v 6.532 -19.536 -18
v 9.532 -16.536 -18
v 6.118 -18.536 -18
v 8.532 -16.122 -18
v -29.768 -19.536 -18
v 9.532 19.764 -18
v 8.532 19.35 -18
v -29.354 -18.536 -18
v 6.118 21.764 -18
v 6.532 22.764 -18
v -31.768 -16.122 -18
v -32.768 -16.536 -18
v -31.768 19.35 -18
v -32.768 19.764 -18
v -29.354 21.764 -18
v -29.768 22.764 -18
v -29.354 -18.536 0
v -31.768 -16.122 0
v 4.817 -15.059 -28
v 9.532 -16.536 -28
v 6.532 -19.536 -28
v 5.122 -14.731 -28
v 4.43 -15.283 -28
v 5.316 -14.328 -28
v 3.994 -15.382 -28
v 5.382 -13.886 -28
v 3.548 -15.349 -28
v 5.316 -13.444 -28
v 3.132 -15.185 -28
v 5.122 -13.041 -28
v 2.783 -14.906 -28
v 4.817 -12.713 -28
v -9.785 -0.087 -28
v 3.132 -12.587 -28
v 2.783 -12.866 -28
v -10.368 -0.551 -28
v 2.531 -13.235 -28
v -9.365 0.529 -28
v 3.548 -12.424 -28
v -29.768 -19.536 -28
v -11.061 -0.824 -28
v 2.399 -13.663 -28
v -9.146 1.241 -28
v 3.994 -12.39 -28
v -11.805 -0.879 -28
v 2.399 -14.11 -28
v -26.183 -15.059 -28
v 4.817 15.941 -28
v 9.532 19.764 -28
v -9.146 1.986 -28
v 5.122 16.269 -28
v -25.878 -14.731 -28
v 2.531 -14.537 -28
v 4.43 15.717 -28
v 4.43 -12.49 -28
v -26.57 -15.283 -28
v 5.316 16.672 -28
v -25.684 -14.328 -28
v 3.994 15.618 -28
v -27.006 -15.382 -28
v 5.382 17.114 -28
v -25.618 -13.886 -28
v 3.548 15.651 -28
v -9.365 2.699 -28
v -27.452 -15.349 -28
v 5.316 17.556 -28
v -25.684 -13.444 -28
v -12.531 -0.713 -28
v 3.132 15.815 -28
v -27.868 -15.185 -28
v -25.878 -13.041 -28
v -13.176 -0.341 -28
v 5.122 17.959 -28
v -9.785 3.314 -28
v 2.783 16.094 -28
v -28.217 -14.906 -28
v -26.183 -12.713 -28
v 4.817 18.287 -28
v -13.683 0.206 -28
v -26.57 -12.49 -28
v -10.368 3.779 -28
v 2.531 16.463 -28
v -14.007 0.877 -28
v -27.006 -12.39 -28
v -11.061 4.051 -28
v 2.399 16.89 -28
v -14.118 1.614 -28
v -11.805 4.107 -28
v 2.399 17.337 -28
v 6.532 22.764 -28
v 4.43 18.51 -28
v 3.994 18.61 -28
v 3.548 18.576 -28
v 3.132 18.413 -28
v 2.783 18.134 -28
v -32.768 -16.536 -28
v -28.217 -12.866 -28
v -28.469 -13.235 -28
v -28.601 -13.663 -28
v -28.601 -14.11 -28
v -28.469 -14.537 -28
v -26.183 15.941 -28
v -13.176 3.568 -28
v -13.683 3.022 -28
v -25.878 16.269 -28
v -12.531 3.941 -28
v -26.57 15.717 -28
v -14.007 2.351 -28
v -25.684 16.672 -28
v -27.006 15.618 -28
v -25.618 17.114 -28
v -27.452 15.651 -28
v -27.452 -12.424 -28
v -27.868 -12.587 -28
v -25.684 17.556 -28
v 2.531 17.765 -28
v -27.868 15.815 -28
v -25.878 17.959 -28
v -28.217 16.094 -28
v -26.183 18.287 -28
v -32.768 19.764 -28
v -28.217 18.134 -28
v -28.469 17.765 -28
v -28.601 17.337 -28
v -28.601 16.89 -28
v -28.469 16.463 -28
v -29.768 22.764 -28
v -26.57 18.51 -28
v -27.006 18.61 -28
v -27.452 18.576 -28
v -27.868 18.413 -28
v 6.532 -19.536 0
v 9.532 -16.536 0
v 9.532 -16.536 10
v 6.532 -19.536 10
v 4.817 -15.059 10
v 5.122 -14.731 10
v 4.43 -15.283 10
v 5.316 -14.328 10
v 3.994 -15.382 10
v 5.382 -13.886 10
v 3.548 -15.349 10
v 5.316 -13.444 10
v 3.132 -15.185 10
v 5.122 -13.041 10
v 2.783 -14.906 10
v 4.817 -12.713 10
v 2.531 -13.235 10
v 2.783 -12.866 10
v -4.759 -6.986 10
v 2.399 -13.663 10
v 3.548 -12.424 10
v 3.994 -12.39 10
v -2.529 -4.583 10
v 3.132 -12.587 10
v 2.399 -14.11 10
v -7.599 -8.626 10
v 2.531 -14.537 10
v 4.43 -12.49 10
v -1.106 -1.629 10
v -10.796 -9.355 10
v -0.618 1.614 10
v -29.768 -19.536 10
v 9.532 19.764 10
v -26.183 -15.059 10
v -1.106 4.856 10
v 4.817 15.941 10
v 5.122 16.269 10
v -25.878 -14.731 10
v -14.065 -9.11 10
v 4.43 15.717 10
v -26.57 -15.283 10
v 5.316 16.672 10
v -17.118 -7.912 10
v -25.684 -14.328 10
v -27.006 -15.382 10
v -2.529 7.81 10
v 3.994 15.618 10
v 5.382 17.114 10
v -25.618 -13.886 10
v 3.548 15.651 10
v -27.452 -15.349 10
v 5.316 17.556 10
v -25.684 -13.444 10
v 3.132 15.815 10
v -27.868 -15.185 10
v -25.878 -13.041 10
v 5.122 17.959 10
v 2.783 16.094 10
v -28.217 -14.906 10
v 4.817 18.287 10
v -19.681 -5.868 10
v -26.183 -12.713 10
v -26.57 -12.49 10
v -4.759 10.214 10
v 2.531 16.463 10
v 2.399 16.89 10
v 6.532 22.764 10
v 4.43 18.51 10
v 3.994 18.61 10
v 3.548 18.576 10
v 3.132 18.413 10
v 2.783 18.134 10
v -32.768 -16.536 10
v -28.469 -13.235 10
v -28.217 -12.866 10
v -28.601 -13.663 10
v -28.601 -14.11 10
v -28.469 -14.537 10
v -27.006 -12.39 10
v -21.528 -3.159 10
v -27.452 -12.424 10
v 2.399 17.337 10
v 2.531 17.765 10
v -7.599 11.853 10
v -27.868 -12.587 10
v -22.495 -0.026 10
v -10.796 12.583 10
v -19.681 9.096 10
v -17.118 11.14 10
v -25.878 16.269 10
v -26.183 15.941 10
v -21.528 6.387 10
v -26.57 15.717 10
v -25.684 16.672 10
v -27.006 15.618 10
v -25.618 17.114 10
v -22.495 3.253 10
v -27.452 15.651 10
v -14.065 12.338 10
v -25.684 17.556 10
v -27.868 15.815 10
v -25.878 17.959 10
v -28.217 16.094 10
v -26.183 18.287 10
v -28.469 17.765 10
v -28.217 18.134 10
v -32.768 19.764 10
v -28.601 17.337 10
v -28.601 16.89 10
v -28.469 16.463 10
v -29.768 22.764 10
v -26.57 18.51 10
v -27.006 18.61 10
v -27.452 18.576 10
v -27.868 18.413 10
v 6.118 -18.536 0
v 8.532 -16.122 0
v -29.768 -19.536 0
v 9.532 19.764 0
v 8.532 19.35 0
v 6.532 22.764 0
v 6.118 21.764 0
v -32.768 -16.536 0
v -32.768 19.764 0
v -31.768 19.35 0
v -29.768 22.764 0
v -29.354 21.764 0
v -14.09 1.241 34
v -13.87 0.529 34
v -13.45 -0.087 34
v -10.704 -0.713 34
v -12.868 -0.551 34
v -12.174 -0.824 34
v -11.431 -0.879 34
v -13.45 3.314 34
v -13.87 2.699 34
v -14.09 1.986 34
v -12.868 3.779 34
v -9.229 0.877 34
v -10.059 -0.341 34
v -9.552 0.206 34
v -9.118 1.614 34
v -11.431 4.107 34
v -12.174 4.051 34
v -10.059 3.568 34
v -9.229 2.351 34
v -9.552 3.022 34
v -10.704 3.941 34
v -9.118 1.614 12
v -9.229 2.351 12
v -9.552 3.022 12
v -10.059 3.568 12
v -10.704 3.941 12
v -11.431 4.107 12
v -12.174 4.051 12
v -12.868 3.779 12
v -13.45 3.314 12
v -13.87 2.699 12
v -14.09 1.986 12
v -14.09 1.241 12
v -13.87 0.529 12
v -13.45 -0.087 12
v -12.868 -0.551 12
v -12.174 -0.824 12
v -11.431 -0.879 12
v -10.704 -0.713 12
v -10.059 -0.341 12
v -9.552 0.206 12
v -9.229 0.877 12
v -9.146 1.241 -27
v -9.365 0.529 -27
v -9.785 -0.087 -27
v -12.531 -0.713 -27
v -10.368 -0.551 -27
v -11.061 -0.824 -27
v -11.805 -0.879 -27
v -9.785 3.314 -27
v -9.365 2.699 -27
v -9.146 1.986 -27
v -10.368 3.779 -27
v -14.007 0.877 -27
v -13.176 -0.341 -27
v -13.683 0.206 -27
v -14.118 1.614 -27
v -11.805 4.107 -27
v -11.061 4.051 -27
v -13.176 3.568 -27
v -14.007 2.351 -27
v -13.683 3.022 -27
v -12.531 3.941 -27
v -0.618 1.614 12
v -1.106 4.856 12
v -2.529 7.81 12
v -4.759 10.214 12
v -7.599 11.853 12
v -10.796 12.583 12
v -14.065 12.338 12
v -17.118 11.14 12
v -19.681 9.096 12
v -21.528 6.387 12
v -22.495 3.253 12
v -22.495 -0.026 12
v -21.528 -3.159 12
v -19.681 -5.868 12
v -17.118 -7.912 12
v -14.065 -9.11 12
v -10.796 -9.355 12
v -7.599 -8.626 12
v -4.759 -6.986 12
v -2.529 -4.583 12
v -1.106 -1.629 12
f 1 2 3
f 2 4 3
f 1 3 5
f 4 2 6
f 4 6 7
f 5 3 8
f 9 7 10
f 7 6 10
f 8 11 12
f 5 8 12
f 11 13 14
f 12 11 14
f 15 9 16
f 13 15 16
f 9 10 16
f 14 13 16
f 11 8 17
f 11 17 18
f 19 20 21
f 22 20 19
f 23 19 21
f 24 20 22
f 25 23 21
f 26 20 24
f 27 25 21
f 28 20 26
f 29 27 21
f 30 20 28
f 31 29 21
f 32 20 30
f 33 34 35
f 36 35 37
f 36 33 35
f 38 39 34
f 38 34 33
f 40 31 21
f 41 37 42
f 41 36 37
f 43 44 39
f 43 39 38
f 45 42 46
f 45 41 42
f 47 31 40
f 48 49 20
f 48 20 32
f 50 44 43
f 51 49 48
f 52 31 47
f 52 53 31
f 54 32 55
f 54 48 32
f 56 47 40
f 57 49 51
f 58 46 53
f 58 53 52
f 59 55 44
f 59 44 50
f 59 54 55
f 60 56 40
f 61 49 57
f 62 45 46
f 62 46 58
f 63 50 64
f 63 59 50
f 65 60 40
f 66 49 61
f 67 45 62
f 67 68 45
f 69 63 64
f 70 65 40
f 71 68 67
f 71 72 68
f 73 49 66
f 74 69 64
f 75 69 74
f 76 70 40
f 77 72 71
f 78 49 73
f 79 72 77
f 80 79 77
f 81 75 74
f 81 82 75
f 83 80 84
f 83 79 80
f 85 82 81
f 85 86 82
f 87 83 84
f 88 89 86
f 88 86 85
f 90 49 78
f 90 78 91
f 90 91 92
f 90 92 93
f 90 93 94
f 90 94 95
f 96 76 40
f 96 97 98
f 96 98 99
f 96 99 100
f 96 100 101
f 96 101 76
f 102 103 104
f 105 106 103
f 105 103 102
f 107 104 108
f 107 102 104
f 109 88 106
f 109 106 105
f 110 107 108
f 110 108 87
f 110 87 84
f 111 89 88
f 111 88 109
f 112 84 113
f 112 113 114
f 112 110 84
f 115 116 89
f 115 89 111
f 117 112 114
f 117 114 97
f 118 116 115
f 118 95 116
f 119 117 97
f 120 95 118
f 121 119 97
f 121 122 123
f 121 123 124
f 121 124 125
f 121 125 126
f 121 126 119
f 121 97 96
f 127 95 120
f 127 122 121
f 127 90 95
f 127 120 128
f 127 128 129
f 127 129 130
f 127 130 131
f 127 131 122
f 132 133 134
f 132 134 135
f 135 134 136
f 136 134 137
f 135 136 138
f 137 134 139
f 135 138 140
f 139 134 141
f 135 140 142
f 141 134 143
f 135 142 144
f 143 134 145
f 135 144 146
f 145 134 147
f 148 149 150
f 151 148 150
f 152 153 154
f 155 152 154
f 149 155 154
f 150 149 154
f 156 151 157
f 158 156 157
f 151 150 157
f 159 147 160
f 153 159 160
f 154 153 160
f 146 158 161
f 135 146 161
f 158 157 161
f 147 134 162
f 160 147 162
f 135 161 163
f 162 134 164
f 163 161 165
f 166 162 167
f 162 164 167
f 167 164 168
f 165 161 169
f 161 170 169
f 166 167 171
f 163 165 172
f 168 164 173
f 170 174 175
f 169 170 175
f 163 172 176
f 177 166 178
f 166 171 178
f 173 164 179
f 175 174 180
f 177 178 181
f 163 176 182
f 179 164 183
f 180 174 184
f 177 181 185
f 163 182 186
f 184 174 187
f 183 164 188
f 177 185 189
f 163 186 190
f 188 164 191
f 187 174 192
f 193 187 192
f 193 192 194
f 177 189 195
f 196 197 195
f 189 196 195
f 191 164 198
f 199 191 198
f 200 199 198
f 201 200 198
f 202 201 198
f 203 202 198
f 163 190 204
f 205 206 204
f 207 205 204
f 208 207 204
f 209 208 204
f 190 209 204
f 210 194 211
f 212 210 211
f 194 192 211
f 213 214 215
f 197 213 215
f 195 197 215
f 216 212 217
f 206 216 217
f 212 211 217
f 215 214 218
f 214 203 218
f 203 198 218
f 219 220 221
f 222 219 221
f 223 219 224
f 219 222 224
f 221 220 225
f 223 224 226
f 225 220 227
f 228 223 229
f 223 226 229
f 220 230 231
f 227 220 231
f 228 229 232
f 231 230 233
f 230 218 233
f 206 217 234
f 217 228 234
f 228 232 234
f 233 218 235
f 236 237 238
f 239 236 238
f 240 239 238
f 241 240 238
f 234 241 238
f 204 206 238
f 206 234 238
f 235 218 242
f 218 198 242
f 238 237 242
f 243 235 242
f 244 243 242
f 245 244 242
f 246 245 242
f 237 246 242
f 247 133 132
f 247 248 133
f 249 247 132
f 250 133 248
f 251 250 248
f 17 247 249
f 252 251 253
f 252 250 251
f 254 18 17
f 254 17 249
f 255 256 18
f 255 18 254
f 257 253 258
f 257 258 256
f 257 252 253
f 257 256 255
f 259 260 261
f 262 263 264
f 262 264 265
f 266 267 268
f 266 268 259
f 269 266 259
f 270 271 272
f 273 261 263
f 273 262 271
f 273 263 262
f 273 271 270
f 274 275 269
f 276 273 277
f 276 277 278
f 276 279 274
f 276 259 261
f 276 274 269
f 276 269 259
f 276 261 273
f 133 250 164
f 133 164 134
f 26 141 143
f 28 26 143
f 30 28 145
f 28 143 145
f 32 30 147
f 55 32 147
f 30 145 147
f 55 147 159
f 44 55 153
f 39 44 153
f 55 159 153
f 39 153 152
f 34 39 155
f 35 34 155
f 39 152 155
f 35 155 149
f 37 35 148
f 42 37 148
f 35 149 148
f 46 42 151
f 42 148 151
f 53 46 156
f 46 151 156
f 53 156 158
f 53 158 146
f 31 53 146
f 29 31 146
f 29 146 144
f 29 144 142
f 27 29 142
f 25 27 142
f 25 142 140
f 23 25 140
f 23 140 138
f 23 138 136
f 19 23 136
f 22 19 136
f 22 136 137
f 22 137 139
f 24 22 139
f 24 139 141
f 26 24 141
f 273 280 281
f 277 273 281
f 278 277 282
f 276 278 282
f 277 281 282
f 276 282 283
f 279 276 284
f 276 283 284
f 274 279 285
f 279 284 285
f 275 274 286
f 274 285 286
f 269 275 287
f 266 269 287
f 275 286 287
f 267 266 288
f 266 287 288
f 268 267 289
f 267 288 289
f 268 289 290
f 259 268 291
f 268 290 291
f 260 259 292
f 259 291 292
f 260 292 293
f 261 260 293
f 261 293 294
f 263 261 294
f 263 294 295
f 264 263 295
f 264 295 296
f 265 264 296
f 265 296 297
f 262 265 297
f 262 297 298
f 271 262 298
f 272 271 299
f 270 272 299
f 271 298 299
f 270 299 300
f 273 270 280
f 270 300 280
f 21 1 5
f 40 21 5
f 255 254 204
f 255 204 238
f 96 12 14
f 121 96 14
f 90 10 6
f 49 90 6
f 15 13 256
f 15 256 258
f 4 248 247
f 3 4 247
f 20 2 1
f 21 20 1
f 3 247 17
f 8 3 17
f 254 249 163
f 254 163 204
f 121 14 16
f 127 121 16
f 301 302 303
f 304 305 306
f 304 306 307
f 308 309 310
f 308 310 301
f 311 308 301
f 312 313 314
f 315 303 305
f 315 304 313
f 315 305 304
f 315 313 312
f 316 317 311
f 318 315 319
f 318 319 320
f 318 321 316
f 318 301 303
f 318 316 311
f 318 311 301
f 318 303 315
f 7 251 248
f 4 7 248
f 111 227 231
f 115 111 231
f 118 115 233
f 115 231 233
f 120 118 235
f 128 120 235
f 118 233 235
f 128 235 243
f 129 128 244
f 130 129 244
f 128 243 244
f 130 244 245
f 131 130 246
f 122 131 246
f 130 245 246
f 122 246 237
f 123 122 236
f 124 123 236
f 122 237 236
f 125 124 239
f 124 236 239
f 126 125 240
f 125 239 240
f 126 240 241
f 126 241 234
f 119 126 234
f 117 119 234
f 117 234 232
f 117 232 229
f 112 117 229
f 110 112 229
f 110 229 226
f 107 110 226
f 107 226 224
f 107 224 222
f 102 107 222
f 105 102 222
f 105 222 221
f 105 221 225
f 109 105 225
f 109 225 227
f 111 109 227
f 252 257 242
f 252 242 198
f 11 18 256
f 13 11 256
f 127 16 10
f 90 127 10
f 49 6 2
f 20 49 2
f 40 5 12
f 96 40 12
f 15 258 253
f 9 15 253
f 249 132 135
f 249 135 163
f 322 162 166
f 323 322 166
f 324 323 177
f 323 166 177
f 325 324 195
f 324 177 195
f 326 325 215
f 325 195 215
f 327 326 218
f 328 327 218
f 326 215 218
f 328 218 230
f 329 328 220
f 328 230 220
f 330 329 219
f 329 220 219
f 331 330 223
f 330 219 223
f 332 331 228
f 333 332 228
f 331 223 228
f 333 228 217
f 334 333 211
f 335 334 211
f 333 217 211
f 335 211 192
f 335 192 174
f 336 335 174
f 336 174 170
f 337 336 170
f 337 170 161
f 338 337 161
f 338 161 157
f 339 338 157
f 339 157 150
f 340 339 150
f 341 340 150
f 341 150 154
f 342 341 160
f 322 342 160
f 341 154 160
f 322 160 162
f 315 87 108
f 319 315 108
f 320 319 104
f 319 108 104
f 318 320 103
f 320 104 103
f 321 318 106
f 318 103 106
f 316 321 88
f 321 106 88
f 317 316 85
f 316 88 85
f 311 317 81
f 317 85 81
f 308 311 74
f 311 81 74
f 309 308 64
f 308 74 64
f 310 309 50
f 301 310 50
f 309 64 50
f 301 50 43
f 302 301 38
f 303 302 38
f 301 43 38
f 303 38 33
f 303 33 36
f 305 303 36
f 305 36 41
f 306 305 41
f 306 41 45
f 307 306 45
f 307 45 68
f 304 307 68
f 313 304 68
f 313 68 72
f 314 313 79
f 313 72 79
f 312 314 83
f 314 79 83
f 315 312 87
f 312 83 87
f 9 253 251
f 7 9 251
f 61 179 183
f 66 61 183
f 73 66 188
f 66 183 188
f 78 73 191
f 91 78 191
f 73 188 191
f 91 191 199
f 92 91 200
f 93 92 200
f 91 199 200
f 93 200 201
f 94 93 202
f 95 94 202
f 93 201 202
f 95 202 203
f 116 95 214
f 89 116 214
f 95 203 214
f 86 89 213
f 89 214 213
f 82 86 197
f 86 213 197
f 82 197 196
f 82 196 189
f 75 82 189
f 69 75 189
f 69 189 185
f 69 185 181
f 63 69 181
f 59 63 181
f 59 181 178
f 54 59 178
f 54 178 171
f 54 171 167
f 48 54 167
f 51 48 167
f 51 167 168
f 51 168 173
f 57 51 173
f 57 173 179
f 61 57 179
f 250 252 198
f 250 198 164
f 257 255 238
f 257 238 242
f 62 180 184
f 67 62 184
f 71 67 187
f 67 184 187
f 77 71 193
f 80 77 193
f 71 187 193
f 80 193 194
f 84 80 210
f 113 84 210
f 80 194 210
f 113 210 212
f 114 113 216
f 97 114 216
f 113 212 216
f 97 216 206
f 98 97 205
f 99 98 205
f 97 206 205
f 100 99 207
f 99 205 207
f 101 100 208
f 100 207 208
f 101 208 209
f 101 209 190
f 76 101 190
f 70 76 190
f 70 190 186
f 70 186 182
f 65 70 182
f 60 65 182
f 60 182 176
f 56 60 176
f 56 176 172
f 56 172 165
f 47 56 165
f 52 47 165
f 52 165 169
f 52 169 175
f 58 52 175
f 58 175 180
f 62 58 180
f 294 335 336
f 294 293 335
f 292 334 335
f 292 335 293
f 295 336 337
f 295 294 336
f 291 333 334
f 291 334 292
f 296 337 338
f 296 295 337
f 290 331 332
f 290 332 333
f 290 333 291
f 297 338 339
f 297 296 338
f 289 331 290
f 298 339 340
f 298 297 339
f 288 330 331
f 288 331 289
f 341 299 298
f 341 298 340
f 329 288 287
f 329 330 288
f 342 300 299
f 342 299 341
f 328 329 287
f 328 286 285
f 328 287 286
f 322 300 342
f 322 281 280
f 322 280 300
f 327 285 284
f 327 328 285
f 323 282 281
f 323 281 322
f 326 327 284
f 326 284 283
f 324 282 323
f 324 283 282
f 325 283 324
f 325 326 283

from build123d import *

# Parameters (mm, degrees)
EXTRUDE_1_DEPTH     = 10
SKETCH_2_R          = 11
EXTRUDE_2_DEPTH     = 2
SKETCH_3_R          = 2.5
EXTRUDE_3_DEPTH     = 22
EXTRUDE_4_DEPTH     = 18
EXTRUDE_5_DEPTH     = 10
SKETCH_4_R          = 1.5
CUT_EXTRUDE_1_DEPTH = 46.5
SKETCH_5_R          = 2.5
CUT_EXTRUDE_2_DEPTH = 1


with BuildPart() as part:
    # Эскиз1 → Бобышка-Вытянуть1 (new body)
    with BuildSketch(Plane.XY):
        Polygon((-32.767753805, -16.536194896), (-32.767753805, 19.763805104), (-29.767753805, 22.763805104), (6.532246195, 22.763805104), (9.532246195, 19.763805104), (9.532246195, -16.536194896), (6.532246195, -19.536194896), (-29.767753805, -19.536194896), align=None)
    extrude(amount=EXTRUDE_1_DEPTH)

    # Эскиз2 → Бобышка-Вытянуть2 (add)
    with BuildSketch(Plane.XY.offset(10)):
        with Locations((-11.617753805, 1.613805104)):
            Circle(SKETCH_2_R)
    extrude(amount=EXTRUDE_2_DEPTH)

    # Эскиз3 → Бобышка-Вытянуть3 (add)
    with BuildSketch(Plane.XY.offset(12)):
        with Locations((-11.617753805, 1.613805104)):
            Circle(SKETCH_3_R)
    extrude(amount=EXTRUDE_3_DEPTH)

    # Эскиз6 → Бобышка-Вытянуть4 (add)
    with BuildSketch(Plane(origin=(0, 0, 0), x_dir=(-1, 0, 0), z_dir=(0, 0, -1))):
        Polygon((11.617753805, 21.763805104), (-6.118032632, 21.763805104), (-8.532246195, 19.349591542), (-8.532246195, -16.121981333), (-6.118032632, -18.536194896), (29.353540243, -18.536194896), (31.767753805, -16.121981333), (31.767753805, 19.349591542), (29.353540243, 21.763805104), align=None)
    extrude(amount=EXTRUDE_4_DEPTH)

    # Эскиз7 → Бобышка-Вытянуть5 (add)
    with BuildSketch(Plane.XY.offset(-18)):
        Polygon((-32.767753805, -16.536194896), (-32.767753805, 19.763805104), (-29.767753805, 22.763805104), (6.532246195, 22.763805104), (9.532246195, 19.763805104), (9.532246195, -16.536194896), (6.532246195, -19.536194896), (-29.767753805, -19.536194896), align=None)
    extrude(amount=-EXTRUDE_5_DEPTH)

    # Эскиз4 → Вырез-Вытянуть1 (cut)
    with BuildSketch(Plane.XY.offset(10)):
        with Locations((-27.117753805, 17.113805104)):
            Circle(SKETCH_4_R)
        with Locations((3.882246195, 17.113805104)):
            Circle(SKETCH_4_R)
        with Locations((3.882246195, -13.886194896)):
            Circle(SKETCH_4_R)
        with Locations((-27.117753805, -13.886194896)):
            Circle(SKETCH_4_R)
    extrude(amount=-CUT_EXTRUDE_1_DEPTH, mode=Mode.SUBTRACT)

    # Эскиз5 → Вырез-Вытянуть2 (cut)
    with BuildSketch(Plane(origin=(0, 0, -28), x_dir=(-1, 0, 0), z_dir=(0, 0, -1))):
        with Locations((11.617753805, 1.613805104)):
            Circle(SKETCH_5_R)
    extrude(amount=-CUT_EXTRUDE_2_DEPTH, mode=Mode.SUBTRACT)


solid = part.part
